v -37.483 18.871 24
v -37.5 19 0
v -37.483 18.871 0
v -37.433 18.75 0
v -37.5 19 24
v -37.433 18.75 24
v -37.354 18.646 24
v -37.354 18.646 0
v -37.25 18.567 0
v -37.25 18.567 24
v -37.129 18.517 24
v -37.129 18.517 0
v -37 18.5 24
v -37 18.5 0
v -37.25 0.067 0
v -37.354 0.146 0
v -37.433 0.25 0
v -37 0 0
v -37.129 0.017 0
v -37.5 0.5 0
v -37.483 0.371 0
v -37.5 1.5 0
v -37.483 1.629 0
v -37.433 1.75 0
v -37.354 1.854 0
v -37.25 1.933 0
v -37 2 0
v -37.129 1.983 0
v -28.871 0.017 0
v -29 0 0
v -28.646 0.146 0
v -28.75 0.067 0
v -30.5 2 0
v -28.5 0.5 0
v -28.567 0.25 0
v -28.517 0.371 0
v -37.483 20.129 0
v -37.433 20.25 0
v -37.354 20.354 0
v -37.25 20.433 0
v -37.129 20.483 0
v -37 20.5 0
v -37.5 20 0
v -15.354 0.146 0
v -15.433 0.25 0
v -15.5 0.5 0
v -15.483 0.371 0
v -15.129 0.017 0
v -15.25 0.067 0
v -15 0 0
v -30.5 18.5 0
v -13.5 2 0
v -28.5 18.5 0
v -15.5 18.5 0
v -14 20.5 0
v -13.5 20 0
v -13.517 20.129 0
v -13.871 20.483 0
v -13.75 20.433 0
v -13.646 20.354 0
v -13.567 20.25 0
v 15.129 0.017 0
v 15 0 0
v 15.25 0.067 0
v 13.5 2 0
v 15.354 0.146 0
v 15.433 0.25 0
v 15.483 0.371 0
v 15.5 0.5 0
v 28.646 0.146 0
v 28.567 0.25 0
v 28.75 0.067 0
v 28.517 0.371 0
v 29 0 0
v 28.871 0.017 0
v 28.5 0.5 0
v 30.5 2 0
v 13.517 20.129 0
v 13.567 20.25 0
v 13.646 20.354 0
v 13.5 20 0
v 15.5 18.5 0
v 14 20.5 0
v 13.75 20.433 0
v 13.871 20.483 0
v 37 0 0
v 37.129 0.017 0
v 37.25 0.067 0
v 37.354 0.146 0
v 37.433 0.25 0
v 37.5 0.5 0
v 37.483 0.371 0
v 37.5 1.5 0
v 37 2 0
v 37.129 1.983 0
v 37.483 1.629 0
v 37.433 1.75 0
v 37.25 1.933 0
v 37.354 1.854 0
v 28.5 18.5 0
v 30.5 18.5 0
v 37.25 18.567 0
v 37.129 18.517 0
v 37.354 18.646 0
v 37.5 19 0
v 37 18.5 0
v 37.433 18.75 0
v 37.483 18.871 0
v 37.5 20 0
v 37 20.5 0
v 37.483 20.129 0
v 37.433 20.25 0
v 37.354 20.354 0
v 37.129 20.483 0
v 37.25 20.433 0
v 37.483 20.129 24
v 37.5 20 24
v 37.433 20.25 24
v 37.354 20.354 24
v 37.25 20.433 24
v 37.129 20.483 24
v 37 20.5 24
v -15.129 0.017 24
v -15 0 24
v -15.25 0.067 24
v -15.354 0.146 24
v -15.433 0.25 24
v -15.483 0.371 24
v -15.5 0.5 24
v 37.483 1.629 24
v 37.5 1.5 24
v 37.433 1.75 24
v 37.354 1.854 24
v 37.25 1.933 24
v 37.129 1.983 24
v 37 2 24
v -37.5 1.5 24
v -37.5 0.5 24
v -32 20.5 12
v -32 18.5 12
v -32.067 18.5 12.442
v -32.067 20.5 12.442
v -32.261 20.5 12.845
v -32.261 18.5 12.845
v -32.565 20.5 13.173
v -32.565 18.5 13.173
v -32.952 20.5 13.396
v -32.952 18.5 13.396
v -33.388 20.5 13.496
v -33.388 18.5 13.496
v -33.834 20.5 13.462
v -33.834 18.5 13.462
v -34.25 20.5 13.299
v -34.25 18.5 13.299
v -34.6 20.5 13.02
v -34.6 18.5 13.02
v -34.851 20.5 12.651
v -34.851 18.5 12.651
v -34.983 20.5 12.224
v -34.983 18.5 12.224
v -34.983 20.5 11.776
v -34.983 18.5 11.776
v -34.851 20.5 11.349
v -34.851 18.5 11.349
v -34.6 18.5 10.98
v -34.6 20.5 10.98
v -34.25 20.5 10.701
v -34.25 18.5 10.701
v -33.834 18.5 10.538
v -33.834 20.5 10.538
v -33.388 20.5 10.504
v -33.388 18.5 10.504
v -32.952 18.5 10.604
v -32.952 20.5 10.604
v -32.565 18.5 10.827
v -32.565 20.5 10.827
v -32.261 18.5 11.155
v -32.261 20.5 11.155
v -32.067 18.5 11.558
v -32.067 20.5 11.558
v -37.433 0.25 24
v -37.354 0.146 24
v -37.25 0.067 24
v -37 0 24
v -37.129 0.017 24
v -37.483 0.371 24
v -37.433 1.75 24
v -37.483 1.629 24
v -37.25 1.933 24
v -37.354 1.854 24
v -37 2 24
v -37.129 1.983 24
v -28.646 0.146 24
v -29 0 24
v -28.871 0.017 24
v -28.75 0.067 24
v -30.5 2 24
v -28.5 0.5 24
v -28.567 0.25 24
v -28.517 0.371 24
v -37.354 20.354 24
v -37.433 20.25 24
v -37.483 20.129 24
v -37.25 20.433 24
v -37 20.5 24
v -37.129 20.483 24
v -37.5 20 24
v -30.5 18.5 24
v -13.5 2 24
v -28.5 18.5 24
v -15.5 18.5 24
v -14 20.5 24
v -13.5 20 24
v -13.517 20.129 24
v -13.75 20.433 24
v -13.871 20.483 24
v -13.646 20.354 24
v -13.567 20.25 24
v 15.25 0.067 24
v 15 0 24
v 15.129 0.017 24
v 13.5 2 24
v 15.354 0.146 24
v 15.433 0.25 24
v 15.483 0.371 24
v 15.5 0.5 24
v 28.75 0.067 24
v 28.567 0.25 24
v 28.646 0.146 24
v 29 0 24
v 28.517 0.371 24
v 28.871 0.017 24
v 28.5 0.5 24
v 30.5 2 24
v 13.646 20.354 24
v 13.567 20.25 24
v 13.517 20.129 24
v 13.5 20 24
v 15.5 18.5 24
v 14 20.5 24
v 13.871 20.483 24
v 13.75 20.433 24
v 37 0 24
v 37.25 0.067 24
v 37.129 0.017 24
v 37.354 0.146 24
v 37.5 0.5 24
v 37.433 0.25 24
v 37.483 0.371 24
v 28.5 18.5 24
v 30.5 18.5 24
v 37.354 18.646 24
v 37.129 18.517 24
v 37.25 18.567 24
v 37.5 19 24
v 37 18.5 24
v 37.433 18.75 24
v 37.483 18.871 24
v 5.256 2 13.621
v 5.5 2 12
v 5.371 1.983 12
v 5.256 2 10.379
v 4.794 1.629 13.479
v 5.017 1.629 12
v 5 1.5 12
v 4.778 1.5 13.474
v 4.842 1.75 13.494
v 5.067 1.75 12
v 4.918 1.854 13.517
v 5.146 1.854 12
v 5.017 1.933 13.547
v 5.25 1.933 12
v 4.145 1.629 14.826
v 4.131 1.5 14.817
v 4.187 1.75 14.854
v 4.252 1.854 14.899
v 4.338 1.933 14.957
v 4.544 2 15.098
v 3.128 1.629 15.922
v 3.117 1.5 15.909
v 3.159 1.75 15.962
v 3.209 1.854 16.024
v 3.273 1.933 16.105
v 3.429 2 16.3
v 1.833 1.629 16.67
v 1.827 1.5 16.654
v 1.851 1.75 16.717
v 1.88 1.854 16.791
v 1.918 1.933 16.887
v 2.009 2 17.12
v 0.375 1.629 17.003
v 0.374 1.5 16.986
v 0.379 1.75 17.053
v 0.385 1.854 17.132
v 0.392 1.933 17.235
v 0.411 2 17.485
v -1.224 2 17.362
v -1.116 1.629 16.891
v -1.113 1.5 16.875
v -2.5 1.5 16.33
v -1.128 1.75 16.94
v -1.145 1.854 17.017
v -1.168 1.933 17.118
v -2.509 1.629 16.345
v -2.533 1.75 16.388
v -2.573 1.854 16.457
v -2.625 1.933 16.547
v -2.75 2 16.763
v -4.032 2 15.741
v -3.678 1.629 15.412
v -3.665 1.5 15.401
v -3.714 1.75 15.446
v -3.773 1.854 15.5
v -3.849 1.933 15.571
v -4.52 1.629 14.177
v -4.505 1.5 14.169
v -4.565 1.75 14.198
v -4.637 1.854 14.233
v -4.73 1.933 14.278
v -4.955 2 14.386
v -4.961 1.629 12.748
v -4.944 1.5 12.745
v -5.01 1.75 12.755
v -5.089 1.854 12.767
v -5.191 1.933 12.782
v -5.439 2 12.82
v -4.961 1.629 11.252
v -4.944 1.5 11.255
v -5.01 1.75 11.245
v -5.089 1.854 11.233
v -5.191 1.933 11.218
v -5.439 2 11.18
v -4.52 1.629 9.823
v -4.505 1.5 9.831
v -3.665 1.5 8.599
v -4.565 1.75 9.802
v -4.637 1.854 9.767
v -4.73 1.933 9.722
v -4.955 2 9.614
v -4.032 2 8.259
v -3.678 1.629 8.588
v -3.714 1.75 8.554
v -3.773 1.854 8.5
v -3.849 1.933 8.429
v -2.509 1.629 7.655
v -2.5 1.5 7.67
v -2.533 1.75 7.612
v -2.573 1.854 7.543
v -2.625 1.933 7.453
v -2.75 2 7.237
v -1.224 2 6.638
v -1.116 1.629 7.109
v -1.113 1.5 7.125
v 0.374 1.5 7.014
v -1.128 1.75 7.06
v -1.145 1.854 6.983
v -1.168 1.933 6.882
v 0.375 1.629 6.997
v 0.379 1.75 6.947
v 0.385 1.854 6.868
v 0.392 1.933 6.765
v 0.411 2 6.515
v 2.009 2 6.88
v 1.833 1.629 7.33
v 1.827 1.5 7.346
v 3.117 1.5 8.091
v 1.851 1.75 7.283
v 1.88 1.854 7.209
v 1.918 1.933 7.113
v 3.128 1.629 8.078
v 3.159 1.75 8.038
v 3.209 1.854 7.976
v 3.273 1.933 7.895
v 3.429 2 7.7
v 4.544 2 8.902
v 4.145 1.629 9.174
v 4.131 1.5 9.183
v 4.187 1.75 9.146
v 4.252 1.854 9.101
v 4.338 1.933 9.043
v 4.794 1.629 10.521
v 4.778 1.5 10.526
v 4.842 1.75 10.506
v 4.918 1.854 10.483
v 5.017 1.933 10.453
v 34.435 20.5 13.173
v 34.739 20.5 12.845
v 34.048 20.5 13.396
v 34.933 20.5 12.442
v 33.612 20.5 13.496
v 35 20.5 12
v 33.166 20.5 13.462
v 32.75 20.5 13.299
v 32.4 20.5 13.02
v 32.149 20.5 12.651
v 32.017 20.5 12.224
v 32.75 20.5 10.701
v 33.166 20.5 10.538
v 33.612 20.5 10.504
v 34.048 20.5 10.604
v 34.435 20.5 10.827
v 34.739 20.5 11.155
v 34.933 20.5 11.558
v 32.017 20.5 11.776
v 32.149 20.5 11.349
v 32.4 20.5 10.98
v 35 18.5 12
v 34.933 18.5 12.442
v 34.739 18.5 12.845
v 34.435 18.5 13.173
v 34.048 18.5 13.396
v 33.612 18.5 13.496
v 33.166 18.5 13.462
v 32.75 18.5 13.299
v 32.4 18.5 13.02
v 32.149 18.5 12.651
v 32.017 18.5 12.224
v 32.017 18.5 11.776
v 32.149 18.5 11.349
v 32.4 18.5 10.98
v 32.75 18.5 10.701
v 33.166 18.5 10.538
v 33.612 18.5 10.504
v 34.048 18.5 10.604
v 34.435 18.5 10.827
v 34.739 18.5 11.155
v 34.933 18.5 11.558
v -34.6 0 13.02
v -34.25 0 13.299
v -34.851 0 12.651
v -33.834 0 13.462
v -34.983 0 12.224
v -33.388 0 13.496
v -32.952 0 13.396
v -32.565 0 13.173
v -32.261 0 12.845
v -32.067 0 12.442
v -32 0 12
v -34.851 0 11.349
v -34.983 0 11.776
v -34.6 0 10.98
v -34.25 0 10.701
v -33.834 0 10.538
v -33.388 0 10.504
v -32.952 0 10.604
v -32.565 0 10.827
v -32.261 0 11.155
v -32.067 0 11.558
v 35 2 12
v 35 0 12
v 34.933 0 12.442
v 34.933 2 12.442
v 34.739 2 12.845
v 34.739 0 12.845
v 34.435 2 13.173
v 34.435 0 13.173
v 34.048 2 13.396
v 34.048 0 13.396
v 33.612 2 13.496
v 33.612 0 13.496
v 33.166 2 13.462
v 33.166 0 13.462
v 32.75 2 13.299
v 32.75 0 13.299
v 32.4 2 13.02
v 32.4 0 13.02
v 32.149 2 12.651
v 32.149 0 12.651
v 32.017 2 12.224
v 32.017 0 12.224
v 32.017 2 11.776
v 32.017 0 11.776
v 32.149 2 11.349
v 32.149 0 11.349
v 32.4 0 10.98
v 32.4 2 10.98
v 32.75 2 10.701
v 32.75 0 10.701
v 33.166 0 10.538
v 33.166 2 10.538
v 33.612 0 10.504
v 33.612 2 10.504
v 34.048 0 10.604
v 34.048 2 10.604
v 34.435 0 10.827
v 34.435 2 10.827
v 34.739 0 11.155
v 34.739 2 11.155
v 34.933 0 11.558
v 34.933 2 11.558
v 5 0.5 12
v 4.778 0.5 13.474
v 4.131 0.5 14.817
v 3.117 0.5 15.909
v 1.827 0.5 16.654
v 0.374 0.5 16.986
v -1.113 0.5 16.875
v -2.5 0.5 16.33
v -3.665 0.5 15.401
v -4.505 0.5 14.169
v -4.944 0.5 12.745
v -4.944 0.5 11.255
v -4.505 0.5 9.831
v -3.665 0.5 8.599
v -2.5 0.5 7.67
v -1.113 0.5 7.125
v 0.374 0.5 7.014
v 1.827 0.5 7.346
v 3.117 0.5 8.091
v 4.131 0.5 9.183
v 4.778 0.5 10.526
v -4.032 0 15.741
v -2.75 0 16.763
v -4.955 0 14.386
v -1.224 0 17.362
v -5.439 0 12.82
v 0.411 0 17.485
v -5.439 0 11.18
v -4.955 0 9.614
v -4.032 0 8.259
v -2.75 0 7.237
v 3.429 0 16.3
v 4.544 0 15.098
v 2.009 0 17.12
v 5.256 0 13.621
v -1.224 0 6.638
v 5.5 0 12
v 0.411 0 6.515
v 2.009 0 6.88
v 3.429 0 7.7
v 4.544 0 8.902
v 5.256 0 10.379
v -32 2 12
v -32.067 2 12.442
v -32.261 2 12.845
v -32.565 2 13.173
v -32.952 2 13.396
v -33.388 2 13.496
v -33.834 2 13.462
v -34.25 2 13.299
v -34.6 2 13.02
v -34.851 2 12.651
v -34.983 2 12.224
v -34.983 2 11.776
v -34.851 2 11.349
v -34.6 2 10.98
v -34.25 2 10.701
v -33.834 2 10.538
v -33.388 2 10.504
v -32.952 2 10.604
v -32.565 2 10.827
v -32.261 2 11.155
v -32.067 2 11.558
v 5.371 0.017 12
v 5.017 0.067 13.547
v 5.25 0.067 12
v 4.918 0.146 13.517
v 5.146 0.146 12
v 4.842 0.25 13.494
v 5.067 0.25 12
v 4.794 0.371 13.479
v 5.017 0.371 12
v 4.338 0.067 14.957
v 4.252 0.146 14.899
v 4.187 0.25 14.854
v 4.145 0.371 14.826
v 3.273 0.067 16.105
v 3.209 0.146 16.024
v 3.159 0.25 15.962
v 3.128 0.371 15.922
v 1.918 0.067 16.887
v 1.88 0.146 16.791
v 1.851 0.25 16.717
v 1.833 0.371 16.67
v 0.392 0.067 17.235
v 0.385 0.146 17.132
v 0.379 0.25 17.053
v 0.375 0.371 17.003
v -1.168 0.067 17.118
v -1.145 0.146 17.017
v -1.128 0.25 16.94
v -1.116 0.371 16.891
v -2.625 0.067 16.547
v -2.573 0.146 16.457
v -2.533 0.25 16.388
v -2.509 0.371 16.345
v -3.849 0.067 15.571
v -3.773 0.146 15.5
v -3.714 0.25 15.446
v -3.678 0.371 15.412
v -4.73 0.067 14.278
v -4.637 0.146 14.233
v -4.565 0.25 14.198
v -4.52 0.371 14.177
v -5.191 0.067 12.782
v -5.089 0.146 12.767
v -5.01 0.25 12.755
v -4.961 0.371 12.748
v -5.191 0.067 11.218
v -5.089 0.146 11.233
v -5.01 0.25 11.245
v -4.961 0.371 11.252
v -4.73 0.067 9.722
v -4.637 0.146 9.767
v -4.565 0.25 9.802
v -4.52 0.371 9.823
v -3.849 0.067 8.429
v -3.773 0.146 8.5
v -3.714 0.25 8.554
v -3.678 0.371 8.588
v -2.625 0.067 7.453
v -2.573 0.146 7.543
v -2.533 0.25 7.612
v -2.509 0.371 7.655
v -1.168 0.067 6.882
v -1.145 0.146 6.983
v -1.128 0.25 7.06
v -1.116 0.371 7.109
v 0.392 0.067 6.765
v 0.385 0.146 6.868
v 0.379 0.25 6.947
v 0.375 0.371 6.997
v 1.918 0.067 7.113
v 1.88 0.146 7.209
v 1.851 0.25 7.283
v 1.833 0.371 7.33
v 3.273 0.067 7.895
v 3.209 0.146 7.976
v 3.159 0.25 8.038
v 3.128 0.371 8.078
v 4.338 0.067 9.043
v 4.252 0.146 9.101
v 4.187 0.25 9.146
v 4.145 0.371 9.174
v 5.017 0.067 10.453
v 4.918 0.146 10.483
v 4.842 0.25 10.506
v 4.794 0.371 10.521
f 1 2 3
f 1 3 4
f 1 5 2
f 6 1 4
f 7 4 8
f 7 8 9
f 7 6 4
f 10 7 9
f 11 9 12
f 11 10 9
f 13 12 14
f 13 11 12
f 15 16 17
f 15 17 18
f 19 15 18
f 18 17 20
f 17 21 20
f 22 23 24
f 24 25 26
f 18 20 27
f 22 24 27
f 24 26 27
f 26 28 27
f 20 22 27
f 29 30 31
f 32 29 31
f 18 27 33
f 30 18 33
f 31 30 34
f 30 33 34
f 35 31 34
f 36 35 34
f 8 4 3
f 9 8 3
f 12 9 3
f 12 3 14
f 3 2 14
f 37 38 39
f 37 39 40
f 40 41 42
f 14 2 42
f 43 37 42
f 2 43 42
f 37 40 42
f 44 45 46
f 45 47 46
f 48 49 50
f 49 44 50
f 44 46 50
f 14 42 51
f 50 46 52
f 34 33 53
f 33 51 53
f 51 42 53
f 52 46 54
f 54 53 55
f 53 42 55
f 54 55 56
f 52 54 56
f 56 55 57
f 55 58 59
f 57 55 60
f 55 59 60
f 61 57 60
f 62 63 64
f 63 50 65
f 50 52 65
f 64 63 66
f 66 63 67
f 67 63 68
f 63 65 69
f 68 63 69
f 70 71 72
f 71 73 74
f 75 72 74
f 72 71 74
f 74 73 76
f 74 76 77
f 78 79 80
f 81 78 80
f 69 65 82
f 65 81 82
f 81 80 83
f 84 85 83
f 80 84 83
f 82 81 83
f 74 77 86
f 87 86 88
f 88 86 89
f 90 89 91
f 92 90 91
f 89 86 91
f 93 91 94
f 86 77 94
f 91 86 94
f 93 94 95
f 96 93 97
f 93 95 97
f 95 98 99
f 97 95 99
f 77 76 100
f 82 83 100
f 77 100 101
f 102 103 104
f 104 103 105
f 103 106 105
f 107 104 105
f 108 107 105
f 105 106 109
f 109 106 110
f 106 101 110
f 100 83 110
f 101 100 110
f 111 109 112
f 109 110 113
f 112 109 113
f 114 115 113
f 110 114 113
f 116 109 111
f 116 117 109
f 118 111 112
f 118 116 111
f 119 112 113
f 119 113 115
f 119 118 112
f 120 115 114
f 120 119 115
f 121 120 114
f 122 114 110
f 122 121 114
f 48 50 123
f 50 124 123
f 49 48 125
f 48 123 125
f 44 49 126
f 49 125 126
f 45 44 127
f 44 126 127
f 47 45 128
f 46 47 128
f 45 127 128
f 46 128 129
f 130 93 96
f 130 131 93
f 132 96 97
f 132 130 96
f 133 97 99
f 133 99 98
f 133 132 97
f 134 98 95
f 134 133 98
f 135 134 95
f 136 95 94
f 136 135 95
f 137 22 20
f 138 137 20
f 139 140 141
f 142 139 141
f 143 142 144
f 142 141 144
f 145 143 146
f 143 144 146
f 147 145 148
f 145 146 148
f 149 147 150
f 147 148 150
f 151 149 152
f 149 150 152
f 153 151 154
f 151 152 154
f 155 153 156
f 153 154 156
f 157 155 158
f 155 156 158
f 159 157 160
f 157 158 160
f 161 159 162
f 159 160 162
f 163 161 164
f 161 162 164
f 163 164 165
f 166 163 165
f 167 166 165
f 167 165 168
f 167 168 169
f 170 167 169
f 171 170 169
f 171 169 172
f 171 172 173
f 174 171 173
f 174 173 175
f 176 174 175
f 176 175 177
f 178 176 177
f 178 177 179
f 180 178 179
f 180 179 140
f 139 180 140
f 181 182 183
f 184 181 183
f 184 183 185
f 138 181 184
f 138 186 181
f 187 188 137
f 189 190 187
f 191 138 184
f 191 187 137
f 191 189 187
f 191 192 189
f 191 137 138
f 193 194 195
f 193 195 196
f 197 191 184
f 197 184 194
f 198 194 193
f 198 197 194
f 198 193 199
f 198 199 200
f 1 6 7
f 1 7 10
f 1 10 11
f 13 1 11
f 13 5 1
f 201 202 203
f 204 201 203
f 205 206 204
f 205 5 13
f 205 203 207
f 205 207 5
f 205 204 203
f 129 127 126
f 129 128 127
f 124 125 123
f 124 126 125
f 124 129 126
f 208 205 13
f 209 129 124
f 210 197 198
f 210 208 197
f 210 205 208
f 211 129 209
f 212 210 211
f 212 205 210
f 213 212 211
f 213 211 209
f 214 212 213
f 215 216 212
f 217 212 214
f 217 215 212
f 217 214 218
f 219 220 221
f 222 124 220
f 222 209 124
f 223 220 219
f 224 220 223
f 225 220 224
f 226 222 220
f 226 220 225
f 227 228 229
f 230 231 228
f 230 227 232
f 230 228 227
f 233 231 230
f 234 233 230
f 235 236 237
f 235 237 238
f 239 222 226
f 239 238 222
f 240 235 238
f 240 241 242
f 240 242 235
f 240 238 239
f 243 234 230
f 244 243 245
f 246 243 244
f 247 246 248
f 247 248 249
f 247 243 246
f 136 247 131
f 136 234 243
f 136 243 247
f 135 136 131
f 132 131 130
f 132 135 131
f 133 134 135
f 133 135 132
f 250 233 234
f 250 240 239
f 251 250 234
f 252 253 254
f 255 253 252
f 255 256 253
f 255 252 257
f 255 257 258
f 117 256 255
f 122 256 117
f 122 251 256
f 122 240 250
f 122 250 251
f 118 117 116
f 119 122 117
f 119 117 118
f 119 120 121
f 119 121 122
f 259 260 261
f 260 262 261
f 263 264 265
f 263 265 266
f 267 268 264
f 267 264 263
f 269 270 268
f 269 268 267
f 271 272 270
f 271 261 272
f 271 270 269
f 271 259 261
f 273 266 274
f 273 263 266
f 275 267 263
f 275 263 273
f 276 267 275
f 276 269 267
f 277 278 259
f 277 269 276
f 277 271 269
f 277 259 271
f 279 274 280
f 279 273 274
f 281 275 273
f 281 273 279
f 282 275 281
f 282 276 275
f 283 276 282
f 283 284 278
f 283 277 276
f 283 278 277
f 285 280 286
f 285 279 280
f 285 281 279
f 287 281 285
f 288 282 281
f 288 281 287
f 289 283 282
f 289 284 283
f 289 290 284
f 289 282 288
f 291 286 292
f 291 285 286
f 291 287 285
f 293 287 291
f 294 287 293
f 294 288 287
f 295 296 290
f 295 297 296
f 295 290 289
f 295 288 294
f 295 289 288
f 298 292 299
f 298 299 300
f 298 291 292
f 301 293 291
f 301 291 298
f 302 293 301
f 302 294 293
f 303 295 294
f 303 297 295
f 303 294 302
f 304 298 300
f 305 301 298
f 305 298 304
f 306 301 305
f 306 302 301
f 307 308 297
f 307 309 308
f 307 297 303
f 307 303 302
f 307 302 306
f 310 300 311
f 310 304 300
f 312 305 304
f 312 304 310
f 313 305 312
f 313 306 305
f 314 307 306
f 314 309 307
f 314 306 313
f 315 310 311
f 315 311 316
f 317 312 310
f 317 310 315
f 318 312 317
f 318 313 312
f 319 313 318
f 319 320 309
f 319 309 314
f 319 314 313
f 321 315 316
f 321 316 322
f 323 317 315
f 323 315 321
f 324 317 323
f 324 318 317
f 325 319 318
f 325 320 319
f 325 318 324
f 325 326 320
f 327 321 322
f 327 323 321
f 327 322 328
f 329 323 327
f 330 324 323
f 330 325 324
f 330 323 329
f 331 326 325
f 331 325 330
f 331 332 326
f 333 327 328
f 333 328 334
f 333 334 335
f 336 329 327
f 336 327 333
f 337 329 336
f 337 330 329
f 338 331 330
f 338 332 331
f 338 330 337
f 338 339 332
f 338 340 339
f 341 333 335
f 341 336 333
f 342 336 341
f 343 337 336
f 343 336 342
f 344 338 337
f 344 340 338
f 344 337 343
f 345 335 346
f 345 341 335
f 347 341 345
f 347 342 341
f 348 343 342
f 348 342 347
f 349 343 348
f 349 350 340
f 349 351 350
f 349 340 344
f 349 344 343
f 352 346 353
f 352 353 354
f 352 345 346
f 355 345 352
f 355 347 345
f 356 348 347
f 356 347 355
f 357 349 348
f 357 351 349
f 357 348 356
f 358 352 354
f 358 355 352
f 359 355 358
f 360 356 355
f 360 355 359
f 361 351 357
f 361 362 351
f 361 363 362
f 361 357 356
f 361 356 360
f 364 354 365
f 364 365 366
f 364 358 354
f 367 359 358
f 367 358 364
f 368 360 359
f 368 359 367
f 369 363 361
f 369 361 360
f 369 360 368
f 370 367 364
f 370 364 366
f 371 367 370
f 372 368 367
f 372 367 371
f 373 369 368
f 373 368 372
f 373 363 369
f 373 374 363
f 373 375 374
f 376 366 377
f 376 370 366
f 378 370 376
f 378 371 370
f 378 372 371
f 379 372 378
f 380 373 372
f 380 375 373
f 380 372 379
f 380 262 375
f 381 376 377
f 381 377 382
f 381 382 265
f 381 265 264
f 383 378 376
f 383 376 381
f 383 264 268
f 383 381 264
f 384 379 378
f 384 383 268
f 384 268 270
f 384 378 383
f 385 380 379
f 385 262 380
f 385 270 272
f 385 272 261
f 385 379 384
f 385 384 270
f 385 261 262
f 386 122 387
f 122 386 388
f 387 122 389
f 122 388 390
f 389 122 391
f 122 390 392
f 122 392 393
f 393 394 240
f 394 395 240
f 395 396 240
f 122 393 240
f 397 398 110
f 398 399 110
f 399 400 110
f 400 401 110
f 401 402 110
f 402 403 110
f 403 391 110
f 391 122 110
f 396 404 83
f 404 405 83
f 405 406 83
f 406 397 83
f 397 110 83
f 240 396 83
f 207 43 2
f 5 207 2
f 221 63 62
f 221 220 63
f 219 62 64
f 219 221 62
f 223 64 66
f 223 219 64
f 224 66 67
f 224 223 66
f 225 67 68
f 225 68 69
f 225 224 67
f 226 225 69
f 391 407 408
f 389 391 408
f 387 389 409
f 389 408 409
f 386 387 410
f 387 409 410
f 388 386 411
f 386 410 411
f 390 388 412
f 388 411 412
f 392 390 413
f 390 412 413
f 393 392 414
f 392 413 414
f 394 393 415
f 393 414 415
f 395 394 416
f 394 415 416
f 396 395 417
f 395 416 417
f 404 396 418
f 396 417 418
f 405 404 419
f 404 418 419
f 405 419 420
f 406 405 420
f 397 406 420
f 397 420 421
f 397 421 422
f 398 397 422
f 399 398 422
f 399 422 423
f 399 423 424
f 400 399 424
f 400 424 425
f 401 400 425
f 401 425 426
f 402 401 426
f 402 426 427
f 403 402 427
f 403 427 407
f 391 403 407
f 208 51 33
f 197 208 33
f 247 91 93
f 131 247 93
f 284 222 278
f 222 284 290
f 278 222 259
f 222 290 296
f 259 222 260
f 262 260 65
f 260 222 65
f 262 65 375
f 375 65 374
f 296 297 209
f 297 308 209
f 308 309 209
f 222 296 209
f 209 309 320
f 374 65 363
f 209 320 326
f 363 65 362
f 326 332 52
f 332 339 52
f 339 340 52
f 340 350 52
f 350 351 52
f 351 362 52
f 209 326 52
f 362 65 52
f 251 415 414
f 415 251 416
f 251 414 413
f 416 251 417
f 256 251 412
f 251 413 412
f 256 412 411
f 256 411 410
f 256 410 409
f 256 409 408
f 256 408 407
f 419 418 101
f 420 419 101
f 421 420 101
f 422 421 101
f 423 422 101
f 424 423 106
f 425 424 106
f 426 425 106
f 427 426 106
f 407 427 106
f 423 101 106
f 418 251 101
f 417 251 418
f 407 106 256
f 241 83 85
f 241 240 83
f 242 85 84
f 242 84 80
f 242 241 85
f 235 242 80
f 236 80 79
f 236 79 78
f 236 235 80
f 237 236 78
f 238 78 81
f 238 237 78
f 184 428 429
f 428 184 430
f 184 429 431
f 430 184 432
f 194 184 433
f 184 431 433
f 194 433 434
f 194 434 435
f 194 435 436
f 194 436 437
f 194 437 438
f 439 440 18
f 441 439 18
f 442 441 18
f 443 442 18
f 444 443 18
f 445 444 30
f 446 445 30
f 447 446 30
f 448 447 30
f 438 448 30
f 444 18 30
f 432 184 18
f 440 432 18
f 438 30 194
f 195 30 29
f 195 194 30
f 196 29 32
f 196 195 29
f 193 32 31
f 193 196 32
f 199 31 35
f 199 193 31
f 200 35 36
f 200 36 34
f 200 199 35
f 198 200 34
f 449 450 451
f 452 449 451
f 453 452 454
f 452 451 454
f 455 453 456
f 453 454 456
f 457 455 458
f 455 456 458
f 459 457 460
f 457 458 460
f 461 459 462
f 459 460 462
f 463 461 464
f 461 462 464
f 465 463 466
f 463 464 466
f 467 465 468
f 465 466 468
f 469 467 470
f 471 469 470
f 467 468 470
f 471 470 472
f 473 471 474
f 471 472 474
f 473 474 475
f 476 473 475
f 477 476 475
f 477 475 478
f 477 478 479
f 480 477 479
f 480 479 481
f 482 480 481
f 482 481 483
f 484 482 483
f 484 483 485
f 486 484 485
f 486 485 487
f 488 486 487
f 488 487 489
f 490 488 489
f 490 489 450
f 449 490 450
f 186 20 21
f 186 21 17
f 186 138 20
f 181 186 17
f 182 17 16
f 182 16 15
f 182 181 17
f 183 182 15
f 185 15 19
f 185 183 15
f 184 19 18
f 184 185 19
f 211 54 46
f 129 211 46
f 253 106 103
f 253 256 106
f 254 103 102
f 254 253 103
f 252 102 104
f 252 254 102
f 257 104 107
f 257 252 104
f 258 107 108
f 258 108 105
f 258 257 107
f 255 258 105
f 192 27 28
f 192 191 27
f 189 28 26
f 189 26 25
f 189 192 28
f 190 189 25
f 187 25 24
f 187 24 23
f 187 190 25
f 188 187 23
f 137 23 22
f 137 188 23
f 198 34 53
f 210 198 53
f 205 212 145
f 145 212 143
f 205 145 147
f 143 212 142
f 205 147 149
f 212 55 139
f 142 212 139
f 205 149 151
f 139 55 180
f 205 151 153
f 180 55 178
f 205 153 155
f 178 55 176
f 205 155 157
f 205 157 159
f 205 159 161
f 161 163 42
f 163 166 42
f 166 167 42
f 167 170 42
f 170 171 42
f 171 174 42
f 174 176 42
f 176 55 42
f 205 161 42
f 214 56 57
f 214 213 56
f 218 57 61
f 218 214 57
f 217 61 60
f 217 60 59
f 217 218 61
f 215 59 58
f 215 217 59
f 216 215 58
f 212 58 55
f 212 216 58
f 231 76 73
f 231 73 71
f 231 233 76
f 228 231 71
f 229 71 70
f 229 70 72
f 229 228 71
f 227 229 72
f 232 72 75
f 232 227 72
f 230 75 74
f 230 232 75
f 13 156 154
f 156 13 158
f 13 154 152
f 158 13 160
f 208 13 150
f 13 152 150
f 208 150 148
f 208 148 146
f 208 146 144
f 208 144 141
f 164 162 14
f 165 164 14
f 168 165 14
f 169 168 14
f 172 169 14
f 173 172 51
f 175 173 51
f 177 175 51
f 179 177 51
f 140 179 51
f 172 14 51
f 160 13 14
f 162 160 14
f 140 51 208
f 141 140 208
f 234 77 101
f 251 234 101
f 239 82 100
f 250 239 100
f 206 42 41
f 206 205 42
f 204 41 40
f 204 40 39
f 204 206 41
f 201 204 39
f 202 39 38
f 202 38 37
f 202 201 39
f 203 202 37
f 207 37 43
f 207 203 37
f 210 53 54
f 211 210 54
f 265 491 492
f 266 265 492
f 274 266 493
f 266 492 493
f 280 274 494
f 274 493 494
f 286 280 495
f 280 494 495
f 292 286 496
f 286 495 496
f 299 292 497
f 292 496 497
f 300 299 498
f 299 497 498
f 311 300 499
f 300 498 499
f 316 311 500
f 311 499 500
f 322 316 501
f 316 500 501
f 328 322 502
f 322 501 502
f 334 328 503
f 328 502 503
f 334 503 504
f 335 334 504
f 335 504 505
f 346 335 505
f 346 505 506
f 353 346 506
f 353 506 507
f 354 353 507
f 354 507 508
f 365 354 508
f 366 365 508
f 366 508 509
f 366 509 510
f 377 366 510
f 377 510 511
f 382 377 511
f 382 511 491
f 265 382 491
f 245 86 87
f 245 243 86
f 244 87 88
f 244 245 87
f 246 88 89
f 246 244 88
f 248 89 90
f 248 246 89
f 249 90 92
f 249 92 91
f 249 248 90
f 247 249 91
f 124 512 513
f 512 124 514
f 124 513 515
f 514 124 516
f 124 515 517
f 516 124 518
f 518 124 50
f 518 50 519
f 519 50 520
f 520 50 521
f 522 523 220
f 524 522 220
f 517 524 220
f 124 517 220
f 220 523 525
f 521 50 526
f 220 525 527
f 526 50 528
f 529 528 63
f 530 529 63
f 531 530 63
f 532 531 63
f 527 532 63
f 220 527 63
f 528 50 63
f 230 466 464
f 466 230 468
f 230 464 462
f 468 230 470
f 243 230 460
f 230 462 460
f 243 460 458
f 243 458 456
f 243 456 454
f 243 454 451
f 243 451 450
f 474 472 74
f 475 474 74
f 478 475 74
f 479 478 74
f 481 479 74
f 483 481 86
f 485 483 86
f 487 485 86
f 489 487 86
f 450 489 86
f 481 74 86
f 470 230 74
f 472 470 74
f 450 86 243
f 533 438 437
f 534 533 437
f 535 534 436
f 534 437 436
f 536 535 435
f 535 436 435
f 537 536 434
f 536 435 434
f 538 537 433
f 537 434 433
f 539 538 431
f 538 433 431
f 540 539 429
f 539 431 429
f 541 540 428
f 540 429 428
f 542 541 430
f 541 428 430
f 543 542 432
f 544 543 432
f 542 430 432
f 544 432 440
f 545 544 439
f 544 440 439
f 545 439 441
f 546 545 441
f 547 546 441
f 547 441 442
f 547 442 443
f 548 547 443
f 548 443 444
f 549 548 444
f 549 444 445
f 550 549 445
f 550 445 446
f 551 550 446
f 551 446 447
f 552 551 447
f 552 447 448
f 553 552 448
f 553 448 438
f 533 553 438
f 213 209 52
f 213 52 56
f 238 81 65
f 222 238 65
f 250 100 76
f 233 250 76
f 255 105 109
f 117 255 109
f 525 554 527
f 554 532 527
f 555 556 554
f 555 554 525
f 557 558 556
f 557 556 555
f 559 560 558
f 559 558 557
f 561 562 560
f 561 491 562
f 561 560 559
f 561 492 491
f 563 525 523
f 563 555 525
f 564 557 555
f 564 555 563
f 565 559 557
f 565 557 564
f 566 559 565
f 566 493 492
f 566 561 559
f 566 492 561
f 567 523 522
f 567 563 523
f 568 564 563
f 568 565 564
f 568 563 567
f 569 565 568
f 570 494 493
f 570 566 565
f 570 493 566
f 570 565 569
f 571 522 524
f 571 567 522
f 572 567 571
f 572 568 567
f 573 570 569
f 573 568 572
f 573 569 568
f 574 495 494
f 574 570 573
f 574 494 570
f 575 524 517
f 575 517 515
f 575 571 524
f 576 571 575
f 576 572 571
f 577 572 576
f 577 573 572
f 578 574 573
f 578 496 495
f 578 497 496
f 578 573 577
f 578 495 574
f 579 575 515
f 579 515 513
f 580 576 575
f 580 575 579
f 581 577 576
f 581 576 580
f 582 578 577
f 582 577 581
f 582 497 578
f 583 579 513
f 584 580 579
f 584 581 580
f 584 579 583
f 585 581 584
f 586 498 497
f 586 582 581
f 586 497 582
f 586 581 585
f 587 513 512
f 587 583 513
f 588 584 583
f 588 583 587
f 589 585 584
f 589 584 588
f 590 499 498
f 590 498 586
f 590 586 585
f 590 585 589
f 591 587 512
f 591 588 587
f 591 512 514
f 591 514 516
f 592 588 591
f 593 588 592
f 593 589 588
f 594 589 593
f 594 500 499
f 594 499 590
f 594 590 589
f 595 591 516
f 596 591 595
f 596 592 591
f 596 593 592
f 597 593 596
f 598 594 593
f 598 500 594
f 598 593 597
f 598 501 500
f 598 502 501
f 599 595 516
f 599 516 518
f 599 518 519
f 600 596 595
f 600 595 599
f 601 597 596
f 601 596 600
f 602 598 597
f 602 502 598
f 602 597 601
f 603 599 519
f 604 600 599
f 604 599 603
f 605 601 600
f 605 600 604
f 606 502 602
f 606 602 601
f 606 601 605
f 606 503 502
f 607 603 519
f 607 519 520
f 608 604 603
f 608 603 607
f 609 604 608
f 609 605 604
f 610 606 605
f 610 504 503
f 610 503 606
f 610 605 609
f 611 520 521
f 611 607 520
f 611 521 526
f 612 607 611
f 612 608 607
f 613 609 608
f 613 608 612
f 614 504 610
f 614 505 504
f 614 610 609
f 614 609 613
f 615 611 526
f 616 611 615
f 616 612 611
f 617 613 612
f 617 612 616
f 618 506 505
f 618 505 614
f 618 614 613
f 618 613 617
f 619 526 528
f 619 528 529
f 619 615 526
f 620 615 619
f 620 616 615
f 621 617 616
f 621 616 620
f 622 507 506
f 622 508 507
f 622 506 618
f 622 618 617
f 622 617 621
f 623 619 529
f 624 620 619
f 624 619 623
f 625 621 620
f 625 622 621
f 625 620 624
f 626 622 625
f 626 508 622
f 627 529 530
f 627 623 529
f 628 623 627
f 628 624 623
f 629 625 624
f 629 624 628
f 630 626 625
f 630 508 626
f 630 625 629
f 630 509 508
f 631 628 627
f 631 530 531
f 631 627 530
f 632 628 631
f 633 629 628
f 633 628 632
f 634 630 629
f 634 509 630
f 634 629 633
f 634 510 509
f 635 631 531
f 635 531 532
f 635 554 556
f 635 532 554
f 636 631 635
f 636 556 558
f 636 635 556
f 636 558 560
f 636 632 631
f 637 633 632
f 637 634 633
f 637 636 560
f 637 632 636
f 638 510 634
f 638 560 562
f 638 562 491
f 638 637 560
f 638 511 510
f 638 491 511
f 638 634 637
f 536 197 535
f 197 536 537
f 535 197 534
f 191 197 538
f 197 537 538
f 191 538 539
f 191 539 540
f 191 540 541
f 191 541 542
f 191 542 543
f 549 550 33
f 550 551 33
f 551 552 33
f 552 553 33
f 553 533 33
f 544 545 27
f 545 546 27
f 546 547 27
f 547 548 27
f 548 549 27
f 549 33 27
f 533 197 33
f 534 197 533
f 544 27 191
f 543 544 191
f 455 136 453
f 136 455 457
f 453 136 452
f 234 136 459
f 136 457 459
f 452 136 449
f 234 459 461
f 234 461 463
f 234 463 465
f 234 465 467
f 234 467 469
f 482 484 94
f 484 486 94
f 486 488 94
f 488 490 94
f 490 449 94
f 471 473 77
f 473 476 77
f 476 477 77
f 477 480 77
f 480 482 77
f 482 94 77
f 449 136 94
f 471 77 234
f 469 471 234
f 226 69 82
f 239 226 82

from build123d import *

# Parameters (mm, degrees)
F1_DEPTH = 24
F2_R     = 1.5
F2_R_2   = 5
F3_DEPTH = 25
F4_R     = 0.5


with BuildPart() as f1:
    # F0 (on Top) → F1 (new body)
    with BuildSketch(Plane.XY):
        Polygon((-15.5, 0), (0, 0), (15.5, 0), (15.5, 18.5), (28.5, 18.5), (28.5, 0), (37.5, 0), (37.5, 2), (30.5, 2), (30.5, 18.5), (37.5, 18.5), (37.5, 20.5), (13.5, 20.5), (13.5, 2), (0, 2), (-13.5, 2), (-13.5, 20.5), (-37.5, 20.5), (-37.5, 18.5), (-30.5, 18.5), (-30.5, 2), (-37.5, 2), (-37.5, 0), (-28.5, 0), (-28.5, 18.5), (-15.5, 18.5), align=None)
    extrude(amount=F1_DEPTH)

    # F2 (on face) → F3 (cut)
    with BuildSketch(Plane.XZ):
        with Locations((-33.5, 12)):
            Circle(F2_R)
        with Locations((0, 12)):
            Circle(F2_R_2)
        with Locations((33.5, 12)):
            Circle(F2_R)
    extrude(amount=-F3_DEPTH, mode=Mode.SUBTRACT)

    # F4
    f4_edges = [f1.edges().sort_by_distance(p)[0] for p in [
        (-13.5, 20.5, 12),
        (13.5, 20.5, 12),
        (15.5, 0, 12),
        (-28.5, 0, 12),
        (-15.5, 0, 12),
        (28.5, 0, 12),
        (37.5, 20.5, 12),
        (37.5, 18.5, 12),
        (37.5, 2, 12),
        (37.5, 0, 12),
        (-37.5, 20.5, 12),
        (-37.5, 18.5, 12),
        (-37.5, 2, 12),
        (-37.5, 0, 12),
        (-5, 0, 12),
        (-5, 2, 12),
    ]]
    fillet(f4_edges, radius=F4_R)


solid = f1.part
